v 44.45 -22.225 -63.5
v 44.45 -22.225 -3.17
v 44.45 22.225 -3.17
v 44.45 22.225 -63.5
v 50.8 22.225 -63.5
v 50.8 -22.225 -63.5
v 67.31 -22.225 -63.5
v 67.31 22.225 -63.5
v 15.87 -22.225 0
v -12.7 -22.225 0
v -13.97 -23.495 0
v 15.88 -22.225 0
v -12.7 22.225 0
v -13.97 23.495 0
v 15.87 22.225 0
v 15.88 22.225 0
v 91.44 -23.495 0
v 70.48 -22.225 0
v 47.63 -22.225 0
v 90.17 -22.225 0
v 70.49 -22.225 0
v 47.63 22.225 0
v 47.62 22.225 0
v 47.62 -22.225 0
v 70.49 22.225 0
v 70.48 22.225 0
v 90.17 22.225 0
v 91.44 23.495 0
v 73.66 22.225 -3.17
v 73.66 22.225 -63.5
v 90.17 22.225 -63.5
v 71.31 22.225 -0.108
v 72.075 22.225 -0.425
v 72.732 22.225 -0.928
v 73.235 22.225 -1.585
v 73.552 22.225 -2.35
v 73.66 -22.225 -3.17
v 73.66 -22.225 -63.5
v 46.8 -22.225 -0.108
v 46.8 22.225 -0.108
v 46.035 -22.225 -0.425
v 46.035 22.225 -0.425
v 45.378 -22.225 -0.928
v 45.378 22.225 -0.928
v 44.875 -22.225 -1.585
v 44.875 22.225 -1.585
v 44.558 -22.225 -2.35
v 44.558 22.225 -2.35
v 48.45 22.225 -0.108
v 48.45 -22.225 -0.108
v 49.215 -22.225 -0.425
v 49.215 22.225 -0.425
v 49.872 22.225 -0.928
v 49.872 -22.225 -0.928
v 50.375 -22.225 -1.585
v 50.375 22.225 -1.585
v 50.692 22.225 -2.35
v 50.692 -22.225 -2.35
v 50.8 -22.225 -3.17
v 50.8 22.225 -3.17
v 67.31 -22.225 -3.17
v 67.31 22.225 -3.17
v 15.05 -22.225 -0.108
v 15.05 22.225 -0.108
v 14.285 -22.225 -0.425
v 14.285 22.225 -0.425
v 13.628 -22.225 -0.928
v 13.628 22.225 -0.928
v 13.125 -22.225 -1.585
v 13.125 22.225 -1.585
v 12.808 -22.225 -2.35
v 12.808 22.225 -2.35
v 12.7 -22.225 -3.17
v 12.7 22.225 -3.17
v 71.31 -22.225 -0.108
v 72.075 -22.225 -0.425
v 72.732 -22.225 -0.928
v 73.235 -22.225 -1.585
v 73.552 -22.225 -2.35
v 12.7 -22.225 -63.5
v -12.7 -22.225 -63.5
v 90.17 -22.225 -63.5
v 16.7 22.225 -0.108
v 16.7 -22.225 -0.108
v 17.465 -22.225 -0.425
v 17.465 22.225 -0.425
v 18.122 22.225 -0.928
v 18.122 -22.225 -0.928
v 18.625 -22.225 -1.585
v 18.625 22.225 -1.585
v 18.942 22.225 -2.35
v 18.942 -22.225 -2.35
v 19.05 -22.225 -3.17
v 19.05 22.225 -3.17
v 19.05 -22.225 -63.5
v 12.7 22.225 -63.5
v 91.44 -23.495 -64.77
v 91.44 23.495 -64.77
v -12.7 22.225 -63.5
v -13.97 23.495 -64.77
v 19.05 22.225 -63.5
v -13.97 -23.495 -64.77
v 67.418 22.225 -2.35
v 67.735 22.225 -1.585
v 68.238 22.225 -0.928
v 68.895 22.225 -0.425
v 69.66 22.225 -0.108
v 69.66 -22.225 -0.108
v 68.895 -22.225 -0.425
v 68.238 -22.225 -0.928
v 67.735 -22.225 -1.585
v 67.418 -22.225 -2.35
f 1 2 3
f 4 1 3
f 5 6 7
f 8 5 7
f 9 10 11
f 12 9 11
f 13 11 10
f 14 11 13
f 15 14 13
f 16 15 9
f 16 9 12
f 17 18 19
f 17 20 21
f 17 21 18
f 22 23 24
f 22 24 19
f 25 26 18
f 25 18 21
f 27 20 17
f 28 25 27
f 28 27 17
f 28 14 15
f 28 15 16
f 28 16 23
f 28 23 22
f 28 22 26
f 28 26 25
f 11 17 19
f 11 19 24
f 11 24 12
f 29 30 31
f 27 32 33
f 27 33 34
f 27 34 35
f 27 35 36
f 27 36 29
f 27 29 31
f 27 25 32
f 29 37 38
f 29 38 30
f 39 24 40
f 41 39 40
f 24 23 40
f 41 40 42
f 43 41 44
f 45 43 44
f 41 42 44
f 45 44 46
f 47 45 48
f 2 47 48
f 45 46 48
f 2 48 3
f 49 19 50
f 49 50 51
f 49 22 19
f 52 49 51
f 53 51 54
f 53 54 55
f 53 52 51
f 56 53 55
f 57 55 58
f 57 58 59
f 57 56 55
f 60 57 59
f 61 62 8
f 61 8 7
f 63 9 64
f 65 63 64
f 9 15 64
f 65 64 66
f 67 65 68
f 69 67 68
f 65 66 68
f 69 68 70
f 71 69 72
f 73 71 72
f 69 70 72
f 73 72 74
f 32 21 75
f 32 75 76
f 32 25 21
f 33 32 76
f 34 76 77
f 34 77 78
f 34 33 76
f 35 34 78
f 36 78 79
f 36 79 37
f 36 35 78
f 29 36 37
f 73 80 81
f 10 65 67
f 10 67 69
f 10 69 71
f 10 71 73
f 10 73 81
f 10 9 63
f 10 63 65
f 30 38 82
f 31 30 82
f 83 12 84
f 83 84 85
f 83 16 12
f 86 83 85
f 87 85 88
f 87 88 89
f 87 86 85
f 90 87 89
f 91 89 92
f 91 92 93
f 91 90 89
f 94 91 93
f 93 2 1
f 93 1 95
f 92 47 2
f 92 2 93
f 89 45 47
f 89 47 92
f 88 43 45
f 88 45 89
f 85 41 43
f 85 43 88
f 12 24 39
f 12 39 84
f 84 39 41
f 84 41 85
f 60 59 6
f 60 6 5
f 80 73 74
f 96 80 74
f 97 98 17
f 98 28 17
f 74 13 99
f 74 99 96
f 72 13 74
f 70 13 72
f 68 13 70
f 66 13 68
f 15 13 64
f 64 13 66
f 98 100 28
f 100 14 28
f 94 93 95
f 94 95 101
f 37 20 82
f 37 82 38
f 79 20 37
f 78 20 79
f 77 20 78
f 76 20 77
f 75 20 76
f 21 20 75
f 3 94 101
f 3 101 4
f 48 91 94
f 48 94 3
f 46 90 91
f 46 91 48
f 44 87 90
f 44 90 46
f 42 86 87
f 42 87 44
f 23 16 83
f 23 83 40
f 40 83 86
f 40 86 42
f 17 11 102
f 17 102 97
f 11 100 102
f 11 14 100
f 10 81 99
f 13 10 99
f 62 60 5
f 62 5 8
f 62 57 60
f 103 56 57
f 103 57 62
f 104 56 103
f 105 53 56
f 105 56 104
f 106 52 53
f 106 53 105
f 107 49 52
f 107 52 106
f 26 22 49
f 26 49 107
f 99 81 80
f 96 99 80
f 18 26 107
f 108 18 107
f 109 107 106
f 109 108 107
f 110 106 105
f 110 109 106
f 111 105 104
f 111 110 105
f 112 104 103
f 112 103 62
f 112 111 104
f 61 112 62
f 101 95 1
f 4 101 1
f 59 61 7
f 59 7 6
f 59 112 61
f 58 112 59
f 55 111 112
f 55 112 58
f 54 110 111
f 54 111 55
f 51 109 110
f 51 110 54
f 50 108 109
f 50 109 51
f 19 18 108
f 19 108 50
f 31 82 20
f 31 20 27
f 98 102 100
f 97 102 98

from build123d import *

# Parameters (mm, degrees)
F0_W     = 1.27
F0_H     = 44.45
F0_W_2   = 6.35
F1_DEPTH = 63.5
F2_W     = 105.41
F2_H     = 46.99
F3_DEPTH = 1.27
F4_R     = 3.17


with BuildPart() as f1:
    # F0 (on Top) → F1 (new body)
    with BuildSketch(Plane.XY):
        Polygon((19.05, -22.225), (12.7, -22.225), (-12.7, -22.225), (-12.7, 22.225), (-13.97, 22.225), (-13.97, -22.225), (-13.97, -23.495), (91.44, -23.495), (91.44, -22.225), (90.17, -22.225), (73.66, -22.225), (67.31, -22.225), (50.8, -22.225), (44.45, -22.225), align=None)
        Polygon((-12.7, 22.225), (12.7, 22.225), (19.05, 22.225), (44.45, 22.225), (50.8, 22.225), (67.31, 22.225), (73.66, 22.225), (90.17, 22.225), (91.44, 22.225), (91.44, 23.495), (-13.97, 23.495), (-13.97, 22.225), align=None)
        with Locations((90.805, 0)):
            Rectangle(F0_W, F0_H)
        Polygon((67.31, 22.225), (67.31, -22.225), (73.66, -22.225), (73.66, 0), (73.66, 22.225), align=None)
        with Locations((47.625, 0)):
            Rectangle(F0_W_2, F0_H)
        with Locations((15.875, 0)):
            Rectangle(F0_W_2, F0_H)
    extrude(amount=-F1_DEPTH)

    # F2 (on face) → F3 (join)
    with BuildSketch(Plane(origin=(0, 0, -63.5), x_dir=(1, 0, 0), z_dir=(0, 0, -1))):
        with Locations((38.735, 0)):
            Rectangle(F2_W, F2_H)
    extrude(amount=F3_DEPTH)

    # F4
    f4_edges = [f1.edges().sort_by_distance(p)[0] for p in [
        (19.05, 0, 0),
        (12.7, 0, 0),
        (44.45, 0, 0),
        (50.8, 0, 0),
        (67.31, 0, 0),
        (73.66, 0, 0),
    ]]
    fillet(f4_edges, radius=F4_R)


solid = f1.part
